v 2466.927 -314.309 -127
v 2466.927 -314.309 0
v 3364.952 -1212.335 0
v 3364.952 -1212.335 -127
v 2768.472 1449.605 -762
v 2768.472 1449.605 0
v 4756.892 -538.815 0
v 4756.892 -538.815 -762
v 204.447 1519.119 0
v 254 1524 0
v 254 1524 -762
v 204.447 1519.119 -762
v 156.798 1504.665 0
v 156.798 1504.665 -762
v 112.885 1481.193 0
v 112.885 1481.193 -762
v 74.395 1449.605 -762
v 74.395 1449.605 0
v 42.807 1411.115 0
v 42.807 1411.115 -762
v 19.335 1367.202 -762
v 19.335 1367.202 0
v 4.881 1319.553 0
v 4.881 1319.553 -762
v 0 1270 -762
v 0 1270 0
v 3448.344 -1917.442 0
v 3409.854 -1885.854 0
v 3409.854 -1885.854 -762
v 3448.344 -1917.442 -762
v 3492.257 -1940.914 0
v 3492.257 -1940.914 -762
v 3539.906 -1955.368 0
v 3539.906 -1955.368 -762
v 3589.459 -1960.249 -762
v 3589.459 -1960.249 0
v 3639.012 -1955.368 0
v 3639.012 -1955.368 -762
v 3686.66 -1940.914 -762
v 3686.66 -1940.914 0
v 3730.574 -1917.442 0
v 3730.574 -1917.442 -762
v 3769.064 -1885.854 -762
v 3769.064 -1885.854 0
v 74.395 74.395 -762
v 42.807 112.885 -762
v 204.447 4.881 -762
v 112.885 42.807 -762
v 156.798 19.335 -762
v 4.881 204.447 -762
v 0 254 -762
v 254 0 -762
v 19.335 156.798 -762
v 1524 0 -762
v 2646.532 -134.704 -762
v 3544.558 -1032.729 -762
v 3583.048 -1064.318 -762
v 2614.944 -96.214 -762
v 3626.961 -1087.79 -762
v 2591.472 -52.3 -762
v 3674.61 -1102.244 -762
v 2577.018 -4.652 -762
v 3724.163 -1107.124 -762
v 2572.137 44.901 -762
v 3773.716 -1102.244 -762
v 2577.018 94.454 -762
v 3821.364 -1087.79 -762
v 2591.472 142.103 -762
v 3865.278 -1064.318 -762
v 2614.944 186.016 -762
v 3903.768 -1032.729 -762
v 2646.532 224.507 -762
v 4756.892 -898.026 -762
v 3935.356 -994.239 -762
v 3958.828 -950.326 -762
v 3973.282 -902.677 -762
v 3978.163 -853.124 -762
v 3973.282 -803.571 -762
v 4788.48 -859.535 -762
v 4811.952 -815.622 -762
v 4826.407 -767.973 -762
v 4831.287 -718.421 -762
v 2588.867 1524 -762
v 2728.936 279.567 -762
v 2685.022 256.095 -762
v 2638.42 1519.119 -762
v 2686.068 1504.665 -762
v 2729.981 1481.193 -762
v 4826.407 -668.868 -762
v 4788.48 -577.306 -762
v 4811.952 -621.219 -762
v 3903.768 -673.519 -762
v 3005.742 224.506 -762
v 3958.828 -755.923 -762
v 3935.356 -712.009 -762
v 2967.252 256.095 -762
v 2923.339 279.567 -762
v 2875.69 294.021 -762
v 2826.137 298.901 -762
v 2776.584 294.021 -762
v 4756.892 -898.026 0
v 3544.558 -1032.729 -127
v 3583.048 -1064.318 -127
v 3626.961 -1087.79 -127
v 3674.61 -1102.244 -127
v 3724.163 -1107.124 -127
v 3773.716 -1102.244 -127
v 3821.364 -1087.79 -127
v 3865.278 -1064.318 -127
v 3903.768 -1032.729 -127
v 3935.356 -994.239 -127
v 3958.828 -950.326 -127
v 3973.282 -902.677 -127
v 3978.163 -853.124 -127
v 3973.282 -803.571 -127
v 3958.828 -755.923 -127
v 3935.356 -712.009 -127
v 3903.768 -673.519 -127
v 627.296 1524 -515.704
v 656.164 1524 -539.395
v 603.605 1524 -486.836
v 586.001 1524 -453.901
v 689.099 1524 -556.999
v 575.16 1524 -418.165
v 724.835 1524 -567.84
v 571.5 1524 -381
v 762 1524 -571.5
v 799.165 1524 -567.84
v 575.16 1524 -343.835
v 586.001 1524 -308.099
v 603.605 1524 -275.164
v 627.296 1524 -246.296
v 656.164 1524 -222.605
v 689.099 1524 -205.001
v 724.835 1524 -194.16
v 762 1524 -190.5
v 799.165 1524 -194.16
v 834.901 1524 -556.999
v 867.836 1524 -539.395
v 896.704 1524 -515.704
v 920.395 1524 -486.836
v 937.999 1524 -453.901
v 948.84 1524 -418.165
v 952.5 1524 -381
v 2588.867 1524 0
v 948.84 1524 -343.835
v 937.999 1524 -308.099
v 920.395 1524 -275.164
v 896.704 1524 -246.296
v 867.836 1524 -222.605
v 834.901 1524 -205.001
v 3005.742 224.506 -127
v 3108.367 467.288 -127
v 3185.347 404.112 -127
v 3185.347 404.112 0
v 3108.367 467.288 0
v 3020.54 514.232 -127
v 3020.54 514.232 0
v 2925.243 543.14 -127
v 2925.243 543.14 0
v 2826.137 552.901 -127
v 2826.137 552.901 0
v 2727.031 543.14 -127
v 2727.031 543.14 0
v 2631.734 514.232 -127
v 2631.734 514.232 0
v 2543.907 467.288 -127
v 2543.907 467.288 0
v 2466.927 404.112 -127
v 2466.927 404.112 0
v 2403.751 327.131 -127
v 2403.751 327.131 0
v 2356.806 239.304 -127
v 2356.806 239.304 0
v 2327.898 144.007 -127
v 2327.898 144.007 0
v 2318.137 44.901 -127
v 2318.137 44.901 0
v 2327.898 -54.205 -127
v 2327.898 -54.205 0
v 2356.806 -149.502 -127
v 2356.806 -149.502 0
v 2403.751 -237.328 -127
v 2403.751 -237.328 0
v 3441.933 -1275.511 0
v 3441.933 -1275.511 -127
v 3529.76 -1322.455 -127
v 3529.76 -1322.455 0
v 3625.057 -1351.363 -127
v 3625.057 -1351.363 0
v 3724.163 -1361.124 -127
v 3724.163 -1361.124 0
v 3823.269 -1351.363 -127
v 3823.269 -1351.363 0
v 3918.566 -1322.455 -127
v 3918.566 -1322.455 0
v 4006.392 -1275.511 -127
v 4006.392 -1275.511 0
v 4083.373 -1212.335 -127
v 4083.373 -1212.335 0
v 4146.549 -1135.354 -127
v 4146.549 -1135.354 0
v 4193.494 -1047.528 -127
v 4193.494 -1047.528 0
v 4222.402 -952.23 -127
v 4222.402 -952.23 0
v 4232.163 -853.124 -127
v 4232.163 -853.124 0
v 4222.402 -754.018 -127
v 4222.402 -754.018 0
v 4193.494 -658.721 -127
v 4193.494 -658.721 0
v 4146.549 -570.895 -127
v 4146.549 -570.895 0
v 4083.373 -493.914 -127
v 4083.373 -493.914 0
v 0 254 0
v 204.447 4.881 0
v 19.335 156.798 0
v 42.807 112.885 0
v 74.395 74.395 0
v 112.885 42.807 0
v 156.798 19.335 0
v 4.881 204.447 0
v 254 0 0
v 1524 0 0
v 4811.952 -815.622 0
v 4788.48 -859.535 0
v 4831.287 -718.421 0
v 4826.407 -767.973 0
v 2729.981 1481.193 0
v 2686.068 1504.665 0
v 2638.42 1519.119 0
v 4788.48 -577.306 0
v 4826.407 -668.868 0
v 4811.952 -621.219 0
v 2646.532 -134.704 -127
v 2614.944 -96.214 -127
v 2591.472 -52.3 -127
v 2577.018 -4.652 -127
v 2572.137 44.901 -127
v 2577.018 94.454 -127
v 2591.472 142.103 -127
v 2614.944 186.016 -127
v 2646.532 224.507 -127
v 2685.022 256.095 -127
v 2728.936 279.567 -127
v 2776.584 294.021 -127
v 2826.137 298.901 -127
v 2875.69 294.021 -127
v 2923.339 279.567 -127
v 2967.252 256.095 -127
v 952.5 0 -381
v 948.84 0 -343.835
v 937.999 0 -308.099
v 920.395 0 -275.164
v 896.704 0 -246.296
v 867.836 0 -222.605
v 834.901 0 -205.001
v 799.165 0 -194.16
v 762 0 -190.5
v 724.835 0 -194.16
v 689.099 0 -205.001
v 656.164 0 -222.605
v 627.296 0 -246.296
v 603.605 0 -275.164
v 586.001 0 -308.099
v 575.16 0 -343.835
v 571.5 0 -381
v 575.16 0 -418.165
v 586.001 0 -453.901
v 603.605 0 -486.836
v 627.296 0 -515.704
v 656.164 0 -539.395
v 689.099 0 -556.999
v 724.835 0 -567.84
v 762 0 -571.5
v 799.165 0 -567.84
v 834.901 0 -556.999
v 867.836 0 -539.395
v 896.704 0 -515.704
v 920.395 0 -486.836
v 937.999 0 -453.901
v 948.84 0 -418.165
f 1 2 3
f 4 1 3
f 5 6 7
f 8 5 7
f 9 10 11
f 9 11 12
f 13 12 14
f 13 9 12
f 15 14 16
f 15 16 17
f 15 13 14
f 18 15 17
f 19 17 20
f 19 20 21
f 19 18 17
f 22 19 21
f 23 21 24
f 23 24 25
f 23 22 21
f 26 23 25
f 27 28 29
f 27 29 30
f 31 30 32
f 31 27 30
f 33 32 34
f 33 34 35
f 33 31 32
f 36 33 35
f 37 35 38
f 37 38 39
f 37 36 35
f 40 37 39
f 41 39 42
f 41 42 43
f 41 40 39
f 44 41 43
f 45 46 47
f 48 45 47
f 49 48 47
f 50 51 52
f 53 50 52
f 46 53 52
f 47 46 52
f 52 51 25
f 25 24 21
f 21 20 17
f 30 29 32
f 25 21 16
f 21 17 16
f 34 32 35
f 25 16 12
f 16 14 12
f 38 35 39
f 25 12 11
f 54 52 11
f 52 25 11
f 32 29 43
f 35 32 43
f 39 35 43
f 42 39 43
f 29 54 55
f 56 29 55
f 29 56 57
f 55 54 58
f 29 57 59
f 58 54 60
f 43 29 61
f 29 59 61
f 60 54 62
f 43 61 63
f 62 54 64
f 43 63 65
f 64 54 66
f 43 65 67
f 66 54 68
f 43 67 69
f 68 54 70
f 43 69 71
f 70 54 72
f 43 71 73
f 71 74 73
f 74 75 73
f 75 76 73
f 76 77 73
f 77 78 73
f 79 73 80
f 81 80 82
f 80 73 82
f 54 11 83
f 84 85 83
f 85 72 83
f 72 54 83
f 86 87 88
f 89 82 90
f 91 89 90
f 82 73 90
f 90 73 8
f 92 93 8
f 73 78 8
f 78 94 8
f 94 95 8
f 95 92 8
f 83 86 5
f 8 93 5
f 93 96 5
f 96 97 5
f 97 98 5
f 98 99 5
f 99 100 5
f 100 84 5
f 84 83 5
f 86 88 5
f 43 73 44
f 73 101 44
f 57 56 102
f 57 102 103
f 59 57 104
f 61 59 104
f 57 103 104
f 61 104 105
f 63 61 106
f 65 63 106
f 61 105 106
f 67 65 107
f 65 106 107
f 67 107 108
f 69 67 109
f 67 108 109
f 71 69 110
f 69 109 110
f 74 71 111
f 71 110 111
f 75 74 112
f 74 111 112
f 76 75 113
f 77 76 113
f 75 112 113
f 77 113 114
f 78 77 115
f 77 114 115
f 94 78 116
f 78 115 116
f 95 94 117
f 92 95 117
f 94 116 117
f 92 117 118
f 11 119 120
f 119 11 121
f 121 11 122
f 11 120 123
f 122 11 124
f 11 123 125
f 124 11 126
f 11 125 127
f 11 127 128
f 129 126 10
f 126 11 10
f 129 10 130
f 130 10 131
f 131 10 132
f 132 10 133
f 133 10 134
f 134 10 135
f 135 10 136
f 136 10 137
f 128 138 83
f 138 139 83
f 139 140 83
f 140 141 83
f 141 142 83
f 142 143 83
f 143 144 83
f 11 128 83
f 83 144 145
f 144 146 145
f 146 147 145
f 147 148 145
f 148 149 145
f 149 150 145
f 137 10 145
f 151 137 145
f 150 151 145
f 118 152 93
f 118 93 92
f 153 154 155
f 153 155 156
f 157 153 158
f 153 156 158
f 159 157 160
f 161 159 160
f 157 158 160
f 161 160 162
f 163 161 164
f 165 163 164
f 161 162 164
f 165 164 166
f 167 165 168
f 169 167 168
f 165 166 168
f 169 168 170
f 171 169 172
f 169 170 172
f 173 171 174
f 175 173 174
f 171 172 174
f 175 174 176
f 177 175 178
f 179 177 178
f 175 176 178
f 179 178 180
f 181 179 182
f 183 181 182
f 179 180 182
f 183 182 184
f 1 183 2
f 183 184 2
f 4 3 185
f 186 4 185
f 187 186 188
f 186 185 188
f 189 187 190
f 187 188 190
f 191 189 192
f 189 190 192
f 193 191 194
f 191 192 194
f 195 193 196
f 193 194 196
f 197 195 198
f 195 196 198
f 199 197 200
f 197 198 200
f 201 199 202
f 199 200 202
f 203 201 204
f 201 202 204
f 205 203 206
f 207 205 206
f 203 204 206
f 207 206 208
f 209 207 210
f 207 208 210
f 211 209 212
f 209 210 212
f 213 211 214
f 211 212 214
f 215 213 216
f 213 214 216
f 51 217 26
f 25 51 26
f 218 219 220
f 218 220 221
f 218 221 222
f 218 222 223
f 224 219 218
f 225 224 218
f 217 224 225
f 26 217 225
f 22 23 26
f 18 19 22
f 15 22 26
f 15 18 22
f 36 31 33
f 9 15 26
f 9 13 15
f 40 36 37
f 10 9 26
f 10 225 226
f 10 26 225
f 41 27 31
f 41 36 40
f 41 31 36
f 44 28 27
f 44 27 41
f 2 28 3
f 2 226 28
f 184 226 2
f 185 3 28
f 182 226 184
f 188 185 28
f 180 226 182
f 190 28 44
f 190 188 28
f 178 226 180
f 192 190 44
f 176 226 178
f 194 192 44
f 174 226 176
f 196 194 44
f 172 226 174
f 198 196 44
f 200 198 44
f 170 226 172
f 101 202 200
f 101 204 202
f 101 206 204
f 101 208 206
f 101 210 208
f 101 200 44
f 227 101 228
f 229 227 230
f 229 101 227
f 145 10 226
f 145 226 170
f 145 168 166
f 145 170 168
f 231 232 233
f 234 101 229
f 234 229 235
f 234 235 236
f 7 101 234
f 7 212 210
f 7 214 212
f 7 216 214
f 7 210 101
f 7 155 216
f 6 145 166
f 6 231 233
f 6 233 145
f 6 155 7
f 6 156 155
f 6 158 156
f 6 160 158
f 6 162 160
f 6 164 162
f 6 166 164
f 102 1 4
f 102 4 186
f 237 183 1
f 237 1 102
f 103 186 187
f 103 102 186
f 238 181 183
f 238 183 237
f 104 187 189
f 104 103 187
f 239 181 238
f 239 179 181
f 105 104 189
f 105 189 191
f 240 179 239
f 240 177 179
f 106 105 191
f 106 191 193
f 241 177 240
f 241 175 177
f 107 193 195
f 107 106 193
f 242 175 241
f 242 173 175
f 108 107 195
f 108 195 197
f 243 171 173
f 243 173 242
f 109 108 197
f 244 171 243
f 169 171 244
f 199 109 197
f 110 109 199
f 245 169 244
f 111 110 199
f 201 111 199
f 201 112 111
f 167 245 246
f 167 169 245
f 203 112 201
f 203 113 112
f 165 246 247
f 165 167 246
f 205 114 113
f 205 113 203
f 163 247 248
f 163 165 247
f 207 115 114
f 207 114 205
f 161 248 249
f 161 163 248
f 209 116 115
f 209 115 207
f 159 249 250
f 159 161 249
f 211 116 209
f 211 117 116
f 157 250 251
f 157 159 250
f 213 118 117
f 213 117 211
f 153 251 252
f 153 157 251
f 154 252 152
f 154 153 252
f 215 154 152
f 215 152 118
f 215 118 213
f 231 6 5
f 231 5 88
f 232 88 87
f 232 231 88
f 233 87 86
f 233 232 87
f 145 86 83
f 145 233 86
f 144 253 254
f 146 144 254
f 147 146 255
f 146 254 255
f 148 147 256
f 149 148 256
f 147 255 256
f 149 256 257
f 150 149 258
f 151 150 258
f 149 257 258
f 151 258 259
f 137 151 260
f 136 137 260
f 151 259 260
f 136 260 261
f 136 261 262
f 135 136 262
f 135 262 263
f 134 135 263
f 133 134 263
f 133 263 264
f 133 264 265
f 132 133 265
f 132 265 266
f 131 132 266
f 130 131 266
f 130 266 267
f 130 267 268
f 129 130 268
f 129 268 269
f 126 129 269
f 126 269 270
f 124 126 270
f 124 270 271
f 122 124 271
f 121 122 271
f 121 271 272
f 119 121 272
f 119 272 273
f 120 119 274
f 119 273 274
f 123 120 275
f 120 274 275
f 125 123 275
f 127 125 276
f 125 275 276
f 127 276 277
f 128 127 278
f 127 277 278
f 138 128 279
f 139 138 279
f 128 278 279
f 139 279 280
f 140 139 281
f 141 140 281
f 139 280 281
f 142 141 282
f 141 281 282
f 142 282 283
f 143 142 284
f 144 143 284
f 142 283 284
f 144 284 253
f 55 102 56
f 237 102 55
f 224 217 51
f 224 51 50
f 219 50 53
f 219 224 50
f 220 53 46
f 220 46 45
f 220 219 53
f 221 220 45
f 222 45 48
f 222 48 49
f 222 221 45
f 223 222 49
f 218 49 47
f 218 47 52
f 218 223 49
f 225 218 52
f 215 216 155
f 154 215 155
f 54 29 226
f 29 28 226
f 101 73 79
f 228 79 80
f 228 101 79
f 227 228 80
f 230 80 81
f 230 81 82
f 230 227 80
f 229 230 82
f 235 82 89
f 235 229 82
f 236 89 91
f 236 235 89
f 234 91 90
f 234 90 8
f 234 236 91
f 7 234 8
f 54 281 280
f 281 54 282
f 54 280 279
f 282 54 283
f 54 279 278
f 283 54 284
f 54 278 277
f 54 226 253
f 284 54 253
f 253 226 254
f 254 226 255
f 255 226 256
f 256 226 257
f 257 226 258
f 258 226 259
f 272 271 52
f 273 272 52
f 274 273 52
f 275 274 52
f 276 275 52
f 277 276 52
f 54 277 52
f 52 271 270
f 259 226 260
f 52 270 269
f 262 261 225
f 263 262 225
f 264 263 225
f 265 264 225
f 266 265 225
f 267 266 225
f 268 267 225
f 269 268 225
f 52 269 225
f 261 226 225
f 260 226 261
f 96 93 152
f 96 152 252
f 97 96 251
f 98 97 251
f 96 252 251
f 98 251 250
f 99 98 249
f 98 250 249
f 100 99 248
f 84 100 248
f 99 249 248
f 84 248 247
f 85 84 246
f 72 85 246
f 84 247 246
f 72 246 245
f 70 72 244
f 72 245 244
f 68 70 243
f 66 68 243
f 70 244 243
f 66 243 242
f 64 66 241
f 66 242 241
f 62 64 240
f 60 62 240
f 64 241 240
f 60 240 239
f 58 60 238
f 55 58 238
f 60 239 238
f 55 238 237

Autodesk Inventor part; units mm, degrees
ref_plane "YZ Plane" through (0, 0, 0) normal (1, 0, 0) x (0, 1, 0)
ref_plane "XZ Plane" through (0, 0, 0) normal (0, 1, 0) x (-1, 0, 0)
ref_plane "XY Plane" through (0, 0, 0) normal (0, 0, 1) x (1, 0, 0)
sketch "Sketch1" plane through (0, 0, 0) normal (0, 0, 1) x (1, 0, 0)
  line L0 (0, 254) -> (0, 1270)
  line L1 (254, 1524) -> (2588.8666, 1524)
  line L2 (2768.4717, 1449.6051) -> (4756.8922, -538.8154)
  line L3 (4756.8922, -898.0256) -> (3769.064, -1885.8538)
  line L4 (3409.8538, -1885.8538) -> (1524, 0)
  line L5 (1524, 0) -> (254, 0)
  arc A0 (254, 1524) -> (0, 1270) centre (254, 1270) ccw
  arc A1 (0, 254) -> (254, 0) centre (254, 254) ccw
  arc A2 (3409.8538, -1885.8538) -> (3769.064, -1885.8538) centre (3589.4589, -1706.2487) ccw
  arc A3 (4756.8922, -898.0256) -> (4756.8922, -538.8154) centre (4577.2871, -718.4205) ccw
  line L6 (2826.1371, 44.9013) -> (3724.1627, -853.1243) construction
  line L7 (3005.7423, 224.5064) -> (3903.7679, -673.5192)
  line L8 (3544.5576, -1032.7295) -> (2646.532, -134.7038)
  arc A4 (3005.7423, 224.5064) -> (2646.532, -134.7038) centre (2826.1371, 44.9013) ccw
  arc A5 (3544.5576, -1032.7295) -> (3903.7679, -673.5192) centre (3724.1627, -853.1243) ccw
  line L9 (2826.1371, 44.9013) -> (3724.1627, -853.1243) construction
  line L10 (2466.9269, -314.309) -> (3364.9525, -1212.3346)
  line L11 (4083.373, -493.9141) -> (3185.3474, 404.1115)
  arc A6 (3185.3474, 404.1115) -> (2466.9269, -314.309) centre (2826.1371, 44.9013) ccw
  arc A7 (3364.9525, -1212.3346) -> (4083.373, -493.9141) centre (3724.1627, -853.1243) ccw
  arc A8 (2768.4717, 1449.6051) -> (2588.8666, 1524) centre (2588.8666, 1270) ccw
  point P0 (0, 0)
  point P1 (0, 1524)
  point P2 (2694.0768, 1524)
  point P3 (4936.4973, -718.4205)
  point P4 (3589.4589, -2065.4589)
  point P5 (3275.1499, -404.1115)
  point P6 (3275.1499, -404.1115)
  dimension "d3" = 1524
  dimension "d4" = 1524
  dimension "d5" = 45
  dimension "d6" = 1905
  dimension "d9" = 2921
  dimension "d10" = 254
  dimension "d11" = 1270
  dimension "d12" = 508
  dimension "d13" = 762
  dimension "d14" = 952.5
  dimension "d15" = 254
  dimension "d26" = 254
extrude "Extrusion1" add sketch "Sketch1" against normal blind 762 contours L0 A0 L1 A8 L2 A3 L3 A2 L4 L5 A1 | A6 L11 A7 L10
extrude "Extrusion2" cut sketch "Sketch1" against normal blind 127 contours A6 L11 A7 L10
sketch "Sketch2" plane through (254, 0, 0) normal (0, -1, 0) x (1, 0, 0)
  circle A0 centre (508, -381) radius 190.5
  line L0 (1270, -762) -> (0, -762) projected
  line L1 (0, 0) -> (0, -762) projected
  point P0 (-254, 0)
  dimension "d20" = 381
  dimension "d21" = 381
  dimension "d23" = 762
extrude "Extrusion3" cut sketch "Sketch2" against normal through all
properties part number "HW 7 Part 5" material "Brass, Soft Yellow"
